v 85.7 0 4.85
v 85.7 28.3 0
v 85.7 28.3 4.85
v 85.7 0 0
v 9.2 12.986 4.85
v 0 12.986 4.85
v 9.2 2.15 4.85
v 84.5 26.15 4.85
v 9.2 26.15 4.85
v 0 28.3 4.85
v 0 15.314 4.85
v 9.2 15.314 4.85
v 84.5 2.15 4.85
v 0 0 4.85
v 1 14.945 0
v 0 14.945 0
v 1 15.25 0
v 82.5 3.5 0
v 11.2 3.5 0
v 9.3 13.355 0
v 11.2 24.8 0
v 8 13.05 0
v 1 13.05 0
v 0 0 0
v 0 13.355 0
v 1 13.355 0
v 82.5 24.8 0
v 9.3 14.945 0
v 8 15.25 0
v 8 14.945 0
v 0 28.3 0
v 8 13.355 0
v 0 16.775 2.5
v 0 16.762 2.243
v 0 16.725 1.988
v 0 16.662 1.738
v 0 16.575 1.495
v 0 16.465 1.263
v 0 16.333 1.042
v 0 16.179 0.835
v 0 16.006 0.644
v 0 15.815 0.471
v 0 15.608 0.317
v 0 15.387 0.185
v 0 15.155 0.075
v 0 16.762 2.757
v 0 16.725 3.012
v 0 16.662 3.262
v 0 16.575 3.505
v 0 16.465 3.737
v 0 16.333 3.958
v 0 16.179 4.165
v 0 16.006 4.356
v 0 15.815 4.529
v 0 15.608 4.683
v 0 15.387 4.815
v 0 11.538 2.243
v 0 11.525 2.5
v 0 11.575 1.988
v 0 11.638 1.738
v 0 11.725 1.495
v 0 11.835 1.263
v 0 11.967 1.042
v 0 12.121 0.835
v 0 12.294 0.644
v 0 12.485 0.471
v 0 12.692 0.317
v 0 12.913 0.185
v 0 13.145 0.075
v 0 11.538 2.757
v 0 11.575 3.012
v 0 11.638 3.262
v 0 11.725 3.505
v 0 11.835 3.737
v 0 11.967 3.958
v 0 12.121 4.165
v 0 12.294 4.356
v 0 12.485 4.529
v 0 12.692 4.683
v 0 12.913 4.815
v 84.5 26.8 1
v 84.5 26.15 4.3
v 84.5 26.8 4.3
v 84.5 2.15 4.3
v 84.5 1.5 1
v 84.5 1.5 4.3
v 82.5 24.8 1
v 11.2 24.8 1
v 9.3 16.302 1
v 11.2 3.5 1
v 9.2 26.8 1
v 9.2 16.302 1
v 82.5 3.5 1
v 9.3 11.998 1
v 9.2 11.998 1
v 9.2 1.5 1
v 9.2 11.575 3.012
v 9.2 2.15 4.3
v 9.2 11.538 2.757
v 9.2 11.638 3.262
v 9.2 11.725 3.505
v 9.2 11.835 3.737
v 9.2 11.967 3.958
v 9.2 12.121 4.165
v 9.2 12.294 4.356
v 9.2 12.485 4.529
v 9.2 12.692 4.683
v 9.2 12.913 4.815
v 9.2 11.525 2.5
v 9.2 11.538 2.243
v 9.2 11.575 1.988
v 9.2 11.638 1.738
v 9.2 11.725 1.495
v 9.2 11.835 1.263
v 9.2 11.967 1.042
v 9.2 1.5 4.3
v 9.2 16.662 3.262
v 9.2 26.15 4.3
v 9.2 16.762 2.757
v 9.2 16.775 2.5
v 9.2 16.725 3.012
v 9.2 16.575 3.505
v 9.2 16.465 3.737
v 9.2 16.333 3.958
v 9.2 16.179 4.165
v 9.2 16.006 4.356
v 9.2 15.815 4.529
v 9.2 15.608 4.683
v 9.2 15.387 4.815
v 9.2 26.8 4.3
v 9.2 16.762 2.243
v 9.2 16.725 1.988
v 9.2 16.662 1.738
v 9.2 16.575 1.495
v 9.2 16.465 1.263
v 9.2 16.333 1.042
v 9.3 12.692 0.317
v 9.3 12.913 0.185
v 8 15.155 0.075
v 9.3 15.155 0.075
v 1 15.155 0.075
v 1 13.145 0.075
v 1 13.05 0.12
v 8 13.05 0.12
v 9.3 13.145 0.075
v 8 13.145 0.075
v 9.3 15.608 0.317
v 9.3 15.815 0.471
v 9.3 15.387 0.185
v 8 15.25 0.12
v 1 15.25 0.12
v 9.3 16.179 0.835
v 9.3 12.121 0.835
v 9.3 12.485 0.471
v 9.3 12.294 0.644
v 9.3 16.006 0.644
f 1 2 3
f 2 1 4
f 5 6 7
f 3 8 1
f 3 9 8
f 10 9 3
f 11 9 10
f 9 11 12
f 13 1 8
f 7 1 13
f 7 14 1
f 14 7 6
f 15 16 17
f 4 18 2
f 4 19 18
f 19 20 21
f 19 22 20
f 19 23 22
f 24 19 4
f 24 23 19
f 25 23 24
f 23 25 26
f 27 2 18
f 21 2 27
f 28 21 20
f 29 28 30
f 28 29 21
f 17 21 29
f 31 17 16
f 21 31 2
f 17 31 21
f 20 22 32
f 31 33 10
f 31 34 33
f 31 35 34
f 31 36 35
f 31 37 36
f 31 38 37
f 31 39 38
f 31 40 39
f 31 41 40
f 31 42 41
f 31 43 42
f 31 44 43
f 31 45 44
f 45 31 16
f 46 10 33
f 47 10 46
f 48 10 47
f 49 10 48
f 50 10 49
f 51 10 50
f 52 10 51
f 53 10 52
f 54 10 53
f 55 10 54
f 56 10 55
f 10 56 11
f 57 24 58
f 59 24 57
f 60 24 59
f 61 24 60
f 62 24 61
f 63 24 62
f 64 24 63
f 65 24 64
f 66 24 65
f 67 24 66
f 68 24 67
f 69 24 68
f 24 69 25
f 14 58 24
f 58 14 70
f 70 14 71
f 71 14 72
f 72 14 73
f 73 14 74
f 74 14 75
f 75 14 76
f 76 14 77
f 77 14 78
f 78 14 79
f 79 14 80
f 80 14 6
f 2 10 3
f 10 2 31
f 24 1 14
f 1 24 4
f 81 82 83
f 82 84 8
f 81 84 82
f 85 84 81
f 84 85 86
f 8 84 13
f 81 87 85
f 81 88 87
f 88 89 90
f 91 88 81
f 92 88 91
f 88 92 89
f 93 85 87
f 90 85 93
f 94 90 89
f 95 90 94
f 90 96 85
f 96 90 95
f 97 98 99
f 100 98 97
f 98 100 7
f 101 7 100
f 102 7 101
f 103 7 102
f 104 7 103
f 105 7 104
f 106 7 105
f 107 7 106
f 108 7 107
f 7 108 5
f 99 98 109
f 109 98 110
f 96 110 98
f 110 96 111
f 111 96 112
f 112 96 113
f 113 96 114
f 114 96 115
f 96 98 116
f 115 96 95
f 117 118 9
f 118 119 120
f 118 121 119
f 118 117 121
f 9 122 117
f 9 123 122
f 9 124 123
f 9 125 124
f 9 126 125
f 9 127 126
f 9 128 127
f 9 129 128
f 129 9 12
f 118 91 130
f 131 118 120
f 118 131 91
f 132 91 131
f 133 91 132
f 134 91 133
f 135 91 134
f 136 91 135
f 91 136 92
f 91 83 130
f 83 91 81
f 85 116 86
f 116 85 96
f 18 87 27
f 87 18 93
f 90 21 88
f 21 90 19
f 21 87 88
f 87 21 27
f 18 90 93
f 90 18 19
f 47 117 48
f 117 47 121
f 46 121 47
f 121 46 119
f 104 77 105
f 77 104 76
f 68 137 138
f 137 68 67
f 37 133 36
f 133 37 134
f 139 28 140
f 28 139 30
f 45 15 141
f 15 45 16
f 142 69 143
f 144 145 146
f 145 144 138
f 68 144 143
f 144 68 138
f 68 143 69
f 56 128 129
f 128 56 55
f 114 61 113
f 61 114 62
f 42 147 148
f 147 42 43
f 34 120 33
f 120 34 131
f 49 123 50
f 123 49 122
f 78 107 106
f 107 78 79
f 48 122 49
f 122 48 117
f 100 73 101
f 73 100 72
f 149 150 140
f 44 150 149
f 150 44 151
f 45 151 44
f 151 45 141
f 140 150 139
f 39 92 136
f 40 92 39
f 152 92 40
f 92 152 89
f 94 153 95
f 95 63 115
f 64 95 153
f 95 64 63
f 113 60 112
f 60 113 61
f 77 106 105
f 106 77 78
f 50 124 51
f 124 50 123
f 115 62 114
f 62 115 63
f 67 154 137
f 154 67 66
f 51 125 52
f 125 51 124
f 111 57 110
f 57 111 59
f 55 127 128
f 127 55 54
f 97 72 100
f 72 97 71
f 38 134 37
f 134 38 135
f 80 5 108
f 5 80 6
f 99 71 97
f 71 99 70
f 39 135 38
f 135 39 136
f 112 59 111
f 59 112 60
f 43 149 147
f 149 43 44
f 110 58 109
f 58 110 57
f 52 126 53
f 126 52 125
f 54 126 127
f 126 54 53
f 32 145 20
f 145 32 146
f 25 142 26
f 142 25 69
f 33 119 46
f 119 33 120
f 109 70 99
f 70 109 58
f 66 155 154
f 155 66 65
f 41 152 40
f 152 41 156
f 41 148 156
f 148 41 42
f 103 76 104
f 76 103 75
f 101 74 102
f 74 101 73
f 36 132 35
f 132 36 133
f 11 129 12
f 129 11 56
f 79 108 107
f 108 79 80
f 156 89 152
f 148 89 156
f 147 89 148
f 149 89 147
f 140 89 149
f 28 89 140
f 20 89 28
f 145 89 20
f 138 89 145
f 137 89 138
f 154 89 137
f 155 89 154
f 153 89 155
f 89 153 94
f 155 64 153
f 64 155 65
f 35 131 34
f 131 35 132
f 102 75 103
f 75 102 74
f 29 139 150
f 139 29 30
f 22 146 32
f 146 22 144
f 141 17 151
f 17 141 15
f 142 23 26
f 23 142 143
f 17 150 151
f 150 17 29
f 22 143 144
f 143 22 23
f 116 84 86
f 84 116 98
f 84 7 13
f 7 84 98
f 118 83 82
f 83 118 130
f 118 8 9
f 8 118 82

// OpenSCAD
// Slide-sized edge-light holder for a 75 x 25 x 3 mm acrylic light guide.
// The LED enters through the left short edge. Print in opaque black material.
// Change only the parameters below for a measured plate or LED.

$fn = 64;

guide_length = 75.0;
guide_width = 25.0;
guide_thickness = 3.0;
guide_clearance = 0.30;

led_diameter = 5.0;       // conventional round LED body
led_clearance = 0.25;
led_lead_slot = 2.2;

floor_thickness = 1.0;
wall = 1.5;
end_wall = 1.2;
led_bay_length = 8.0;
top_lip = 0.55;
lip_depth = 0.65;

cavity_x = led_bay_length + end_wall;
cavity_y = wall;
cavity_z = floor_thickness;
cavity_l = guide_length + guide_clearance;
cavity_w = guide_width + guide_clearance;
cavity_h = guide_thickness + guide_clearance;

outer_l = cavity_x + cavity_l + end_wall;
outer_w = cavity_w + 2 * wall;
outer_h = cavity_z + cavity_h + top_lip;
led_axis_z = cavity_z + guide_thickness / 2;

module holder() {
  difference() {
    union() {
      cube([outer_l, outer_w, outer_h]);
    }

    // Guide cavity is open at the top; it can be pressed under the two lips.
    translate([cavity_x, cavity_y, cavity_z])
      cube([cavity_l, cavity_w, cavity_h + top_lip + 0.1]);

    // Open most of the floor so only a narrow support frame remains. This
    // allows a removable white reflector card to sit below the light guide.
    translate([cavity_x + 2.0, cavity_y + 2.0, -0.1])
      cube([cavity_l - 4.0, cavity_w - 4.0, floor_thickness + 0.2]);

    // Round LED bore; its axis is centered on the acrylic thickness.
    translate([-0.1, outer_w / 2, led_axis_z])
      rotate([0, 90, 0])
        cylinder(h = cavity_x + 0.2, d = led_diameter + led_clearance);

    // Lead/wire escape slot down through the bottom of the LED bay.
    translate([1.0, outer_w / 2 - led_lead_slot / 2, -0.1])
      cube([led_bay_length - 1.0, led_lead_slot, led_axis_z + 0.1]);
  }

  // Retaining lips along long sides; leave the optical field unobstructed.
  translate([cavity_x, cavity_y, cavity_z + cavity_h])
    cube([cavity_l, lip_depth, top_lip]);
  translate([cavity_x, cavity_y + cavity_w - lip_depth, cavity_z + cavity_h])
    cube([cavity_l, lip_depth, top_lip]);
}

holder();
